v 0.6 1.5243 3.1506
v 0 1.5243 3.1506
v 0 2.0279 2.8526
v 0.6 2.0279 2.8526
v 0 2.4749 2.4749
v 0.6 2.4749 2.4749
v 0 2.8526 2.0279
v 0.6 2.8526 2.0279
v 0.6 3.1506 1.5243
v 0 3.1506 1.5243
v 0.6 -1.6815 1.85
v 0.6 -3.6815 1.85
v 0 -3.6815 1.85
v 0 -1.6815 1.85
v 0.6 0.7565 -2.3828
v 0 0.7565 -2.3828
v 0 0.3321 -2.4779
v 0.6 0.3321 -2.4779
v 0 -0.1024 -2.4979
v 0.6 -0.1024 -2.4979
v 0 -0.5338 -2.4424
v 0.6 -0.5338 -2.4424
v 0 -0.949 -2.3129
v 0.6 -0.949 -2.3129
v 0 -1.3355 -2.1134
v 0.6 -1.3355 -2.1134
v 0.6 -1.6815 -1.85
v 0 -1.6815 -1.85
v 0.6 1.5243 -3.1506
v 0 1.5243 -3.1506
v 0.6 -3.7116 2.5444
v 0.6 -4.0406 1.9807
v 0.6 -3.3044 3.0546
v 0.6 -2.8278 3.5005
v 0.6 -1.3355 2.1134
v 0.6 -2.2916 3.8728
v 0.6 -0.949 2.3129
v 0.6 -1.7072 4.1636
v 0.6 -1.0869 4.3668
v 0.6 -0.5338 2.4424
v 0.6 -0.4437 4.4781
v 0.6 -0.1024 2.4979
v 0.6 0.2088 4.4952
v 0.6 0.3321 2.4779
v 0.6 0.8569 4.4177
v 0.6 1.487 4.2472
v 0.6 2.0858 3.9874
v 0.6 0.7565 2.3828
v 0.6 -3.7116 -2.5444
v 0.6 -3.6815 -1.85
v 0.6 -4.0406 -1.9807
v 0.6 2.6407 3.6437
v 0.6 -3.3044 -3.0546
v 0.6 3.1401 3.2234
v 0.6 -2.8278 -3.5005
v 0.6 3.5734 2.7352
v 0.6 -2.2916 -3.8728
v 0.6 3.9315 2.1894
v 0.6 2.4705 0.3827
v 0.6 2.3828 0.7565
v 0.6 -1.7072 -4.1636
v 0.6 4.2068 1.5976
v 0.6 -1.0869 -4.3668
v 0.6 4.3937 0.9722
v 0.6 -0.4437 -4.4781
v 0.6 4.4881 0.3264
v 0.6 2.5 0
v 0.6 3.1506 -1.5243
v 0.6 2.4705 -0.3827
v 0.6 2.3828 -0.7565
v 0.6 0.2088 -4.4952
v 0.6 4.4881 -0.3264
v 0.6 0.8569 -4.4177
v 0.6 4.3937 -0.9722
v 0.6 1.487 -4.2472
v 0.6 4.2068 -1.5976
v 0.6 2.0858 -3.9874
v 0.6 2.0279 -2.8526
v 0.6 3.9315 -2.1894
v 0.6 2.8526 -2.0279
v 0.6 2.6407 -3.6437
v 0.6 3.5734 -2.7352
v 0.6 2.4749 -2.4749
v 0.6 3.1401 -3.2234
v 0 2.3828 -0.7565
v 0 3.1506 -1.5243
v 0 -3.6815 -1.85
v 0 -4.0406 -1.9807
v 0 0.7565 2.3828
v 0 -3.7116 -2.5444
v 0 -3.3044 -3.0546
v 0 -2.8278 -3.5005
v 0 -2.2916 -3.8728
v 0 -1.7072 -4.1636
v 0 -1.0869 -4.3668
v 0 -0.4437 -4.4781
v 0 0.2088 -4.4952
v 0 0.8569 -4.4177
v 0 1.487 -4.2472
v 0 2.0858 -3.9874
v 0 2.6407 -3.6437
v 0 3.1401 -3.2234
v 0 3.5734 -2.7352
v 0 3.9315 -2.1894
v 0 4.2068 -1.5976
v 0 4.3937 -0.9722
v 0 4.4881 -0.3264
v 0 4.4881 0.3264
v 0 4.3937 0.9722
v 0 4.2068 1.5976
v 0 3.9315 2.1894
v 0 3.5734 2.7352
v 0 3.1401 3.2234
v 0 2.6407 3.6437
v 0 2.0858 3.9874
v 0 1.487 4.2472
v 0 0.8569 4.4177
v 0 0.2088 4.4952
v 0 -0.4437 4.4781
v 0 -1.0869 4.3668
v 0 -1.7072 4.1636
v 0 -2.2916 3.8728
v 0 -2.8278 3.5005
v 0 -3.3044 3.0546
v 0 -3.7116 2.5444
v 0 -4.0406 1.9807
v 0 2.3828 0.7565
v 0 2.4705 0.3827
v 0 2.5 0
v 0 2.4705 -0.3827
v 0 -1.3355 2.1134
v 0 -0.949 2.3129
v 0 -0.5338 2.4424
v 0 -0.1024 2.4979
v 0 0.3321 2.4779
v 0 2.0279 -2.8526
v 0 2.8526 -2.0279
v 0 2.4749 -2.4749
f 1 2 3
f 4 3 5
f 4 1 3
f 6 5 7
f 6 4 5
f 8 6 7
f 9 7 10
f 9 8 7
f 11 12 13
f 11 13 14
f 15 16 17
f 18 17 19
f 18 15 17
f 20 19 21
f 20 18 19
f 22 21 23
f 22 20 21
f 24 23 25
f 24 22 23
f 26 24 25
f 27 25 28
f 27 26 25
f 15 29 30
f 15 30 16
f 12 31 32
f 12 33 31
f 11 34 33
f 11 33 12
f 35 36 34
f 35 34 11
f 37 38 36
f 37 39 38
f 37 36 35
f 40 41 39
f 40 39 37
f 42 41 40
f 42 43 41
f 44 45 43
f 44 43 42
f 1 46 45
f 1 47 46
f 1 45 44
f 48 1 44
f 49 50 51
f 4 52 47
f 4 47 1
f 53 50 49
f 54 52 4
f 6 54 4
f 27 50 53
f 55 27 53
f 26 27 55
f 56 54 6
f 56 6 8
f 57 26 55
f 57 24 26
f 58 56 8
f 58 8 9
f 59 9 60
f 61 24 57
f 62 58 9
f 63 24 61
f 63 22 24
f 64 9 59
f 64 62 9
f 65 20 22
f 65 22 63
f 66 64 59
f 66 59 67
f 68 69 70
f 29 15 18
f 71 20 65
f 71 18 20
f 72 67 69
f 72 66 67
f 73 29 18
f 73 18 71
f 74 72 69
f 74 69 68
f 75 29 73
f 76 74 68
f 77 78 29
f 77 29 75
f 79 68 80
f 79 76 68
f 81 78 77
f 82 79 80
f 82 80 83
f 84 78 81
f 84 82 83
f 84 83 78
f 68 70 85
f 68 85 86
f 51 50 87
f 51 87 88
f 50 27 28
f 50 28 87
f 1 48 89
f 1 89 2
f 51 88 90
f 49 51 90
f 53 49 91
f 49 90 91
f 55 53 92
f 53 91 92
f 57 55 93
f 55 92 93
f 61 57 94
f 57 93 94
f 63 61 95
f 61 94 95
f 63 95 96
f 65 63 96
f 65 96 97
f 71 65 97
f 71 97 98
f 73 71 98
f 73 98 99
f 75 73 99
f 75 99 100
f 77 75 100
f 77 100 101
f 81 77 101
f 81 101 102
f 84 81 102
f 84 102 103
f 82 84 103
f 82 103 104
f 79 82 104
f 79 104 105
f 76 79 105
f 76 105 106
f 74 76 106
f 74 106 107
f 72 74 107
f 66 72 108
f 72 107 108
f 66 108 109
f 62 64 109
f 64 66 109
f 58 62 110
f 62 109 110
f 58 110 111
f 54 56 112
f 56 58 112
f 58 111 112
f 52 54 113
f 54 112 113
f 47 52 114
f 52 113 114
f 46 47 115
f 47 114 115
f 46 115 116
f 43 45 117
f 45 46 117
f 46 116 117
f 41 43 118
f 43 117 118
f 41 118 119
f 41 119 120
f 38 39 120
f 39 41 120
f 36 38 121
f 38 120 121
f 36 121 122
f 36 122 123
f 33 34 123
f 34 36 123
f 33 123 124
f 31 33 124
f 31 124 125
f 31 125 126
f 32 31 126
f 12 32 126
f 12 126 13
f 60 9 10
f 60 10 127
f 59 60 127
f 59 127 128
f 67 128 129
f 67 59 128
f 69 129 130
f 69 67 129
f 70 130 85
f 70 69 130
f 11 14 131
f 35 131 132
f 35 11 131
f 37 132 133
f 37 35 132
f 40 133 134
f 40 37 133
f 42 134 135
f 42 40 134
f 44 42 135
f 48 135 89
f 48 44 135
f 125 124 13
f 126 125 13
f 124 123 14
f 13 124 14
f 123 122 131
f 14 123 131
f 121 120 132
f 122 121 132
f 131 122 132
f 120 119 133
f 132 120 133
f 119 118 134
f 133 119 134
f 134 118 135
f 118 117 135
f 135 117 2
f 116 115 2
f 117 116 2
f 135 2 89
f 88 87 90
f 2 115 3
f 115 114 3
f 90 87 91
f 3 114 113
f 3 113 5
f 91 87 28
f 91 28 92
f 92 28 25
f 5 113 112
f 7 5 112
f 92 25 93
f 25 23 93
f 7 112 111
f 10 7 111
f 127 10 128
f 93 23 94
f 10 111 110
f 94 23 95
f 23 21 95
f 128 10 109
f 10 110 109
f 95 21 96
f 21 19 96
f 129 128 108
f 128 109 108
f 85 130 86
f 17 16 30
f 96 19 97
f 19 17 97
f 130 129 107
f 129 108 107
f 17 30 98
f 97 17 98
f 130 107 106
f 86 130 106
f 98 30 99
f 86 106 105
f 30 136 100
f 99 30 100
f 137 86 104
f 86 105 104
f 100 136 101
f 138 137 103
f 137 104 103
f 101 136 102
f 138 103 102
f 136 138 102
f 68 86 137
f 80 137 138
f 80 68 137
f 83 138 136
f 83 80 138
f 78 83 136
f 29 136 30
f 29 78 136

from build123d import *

# Parameters (mm, degrees)
ESQUISSE1_R             = 4.5
BASE_EXTRUSION_DEPTH    = 0.6
ENL_V_MAT_EXTRU_1_DEPTH = 7.392182726


with BuildPart() as part:
    # Esquisse1 → Base-Extrusion (new body)
    with BuildSketch(Plane(origin=(0, 0, 0), x_dir=(0, 0, -1), z_dir=(1, 0, 0))):
        Circle(ESQUISSE1_R)
    extrude(amount=BASE_EXTRUSION_DEPTH)

    # Esquisse2 → Enlèv. mat.-Extru.1 (cut, through all)
    with BuildSketch(Plane(origin=(0.6, 0, 0), x_dir=(0, 0, -1), z_dir=(1, 0, 0))):
        with BuildLine():
            Line((0.756460917, 2.382806514), (1.524293779, 3.150639376))
            ThreePointArc((1.524293779, 3.150639376), (2.474873734, 2.474873734), (3.150639376, 1.524293779))
            Line((3.150639376, 1.524293779), (2.382806514, 0.756460917))
            ThreePointArc((2.382806514, 0.756460917), (2.442354814, -0.533763022), (1.85, -1.681517172))
            Line((1.85, -1.681517172), (1.85, -3.681517172))
            Line((1.85, -3.681517172), (1.980710639, -4.040641702))
            ThreePointArc((1.980710639, -4.040641702), (0, -4.5), (-1.980710639, -4.040641702))
            Line((-1.980710639, -4.040641702), (-1.85, -3.681517172))
            Line((-1.85, -3.681517172), (-1.85, -1.681517172))
            ThreePointArc((-1.85, -1.681517172), (-2.442354814, -0.533763022), (-2.382806514, 0.756460917))
            Line((-2.382806514, 0.756460917), (-3.150639376, 1.524293779))
            ThreePointArc((-3.150639376, 1.524293779), (-2.474873734, 2.474873734), (-1.524293779, 3.150639376))
            Line((-1.524293779, 3.150639376), (-0.756460917, 2.382806514))
            ThreePointArc((-0.756460917, 2.382806514), (0, 2.5), (0.756460917, 2.382806514))
        make_face()
    extrude(amount=-ENL_V_MAT_EXTRU_1_DEPTH, mode=Mode.SUBTRACT)


solid = part.part
